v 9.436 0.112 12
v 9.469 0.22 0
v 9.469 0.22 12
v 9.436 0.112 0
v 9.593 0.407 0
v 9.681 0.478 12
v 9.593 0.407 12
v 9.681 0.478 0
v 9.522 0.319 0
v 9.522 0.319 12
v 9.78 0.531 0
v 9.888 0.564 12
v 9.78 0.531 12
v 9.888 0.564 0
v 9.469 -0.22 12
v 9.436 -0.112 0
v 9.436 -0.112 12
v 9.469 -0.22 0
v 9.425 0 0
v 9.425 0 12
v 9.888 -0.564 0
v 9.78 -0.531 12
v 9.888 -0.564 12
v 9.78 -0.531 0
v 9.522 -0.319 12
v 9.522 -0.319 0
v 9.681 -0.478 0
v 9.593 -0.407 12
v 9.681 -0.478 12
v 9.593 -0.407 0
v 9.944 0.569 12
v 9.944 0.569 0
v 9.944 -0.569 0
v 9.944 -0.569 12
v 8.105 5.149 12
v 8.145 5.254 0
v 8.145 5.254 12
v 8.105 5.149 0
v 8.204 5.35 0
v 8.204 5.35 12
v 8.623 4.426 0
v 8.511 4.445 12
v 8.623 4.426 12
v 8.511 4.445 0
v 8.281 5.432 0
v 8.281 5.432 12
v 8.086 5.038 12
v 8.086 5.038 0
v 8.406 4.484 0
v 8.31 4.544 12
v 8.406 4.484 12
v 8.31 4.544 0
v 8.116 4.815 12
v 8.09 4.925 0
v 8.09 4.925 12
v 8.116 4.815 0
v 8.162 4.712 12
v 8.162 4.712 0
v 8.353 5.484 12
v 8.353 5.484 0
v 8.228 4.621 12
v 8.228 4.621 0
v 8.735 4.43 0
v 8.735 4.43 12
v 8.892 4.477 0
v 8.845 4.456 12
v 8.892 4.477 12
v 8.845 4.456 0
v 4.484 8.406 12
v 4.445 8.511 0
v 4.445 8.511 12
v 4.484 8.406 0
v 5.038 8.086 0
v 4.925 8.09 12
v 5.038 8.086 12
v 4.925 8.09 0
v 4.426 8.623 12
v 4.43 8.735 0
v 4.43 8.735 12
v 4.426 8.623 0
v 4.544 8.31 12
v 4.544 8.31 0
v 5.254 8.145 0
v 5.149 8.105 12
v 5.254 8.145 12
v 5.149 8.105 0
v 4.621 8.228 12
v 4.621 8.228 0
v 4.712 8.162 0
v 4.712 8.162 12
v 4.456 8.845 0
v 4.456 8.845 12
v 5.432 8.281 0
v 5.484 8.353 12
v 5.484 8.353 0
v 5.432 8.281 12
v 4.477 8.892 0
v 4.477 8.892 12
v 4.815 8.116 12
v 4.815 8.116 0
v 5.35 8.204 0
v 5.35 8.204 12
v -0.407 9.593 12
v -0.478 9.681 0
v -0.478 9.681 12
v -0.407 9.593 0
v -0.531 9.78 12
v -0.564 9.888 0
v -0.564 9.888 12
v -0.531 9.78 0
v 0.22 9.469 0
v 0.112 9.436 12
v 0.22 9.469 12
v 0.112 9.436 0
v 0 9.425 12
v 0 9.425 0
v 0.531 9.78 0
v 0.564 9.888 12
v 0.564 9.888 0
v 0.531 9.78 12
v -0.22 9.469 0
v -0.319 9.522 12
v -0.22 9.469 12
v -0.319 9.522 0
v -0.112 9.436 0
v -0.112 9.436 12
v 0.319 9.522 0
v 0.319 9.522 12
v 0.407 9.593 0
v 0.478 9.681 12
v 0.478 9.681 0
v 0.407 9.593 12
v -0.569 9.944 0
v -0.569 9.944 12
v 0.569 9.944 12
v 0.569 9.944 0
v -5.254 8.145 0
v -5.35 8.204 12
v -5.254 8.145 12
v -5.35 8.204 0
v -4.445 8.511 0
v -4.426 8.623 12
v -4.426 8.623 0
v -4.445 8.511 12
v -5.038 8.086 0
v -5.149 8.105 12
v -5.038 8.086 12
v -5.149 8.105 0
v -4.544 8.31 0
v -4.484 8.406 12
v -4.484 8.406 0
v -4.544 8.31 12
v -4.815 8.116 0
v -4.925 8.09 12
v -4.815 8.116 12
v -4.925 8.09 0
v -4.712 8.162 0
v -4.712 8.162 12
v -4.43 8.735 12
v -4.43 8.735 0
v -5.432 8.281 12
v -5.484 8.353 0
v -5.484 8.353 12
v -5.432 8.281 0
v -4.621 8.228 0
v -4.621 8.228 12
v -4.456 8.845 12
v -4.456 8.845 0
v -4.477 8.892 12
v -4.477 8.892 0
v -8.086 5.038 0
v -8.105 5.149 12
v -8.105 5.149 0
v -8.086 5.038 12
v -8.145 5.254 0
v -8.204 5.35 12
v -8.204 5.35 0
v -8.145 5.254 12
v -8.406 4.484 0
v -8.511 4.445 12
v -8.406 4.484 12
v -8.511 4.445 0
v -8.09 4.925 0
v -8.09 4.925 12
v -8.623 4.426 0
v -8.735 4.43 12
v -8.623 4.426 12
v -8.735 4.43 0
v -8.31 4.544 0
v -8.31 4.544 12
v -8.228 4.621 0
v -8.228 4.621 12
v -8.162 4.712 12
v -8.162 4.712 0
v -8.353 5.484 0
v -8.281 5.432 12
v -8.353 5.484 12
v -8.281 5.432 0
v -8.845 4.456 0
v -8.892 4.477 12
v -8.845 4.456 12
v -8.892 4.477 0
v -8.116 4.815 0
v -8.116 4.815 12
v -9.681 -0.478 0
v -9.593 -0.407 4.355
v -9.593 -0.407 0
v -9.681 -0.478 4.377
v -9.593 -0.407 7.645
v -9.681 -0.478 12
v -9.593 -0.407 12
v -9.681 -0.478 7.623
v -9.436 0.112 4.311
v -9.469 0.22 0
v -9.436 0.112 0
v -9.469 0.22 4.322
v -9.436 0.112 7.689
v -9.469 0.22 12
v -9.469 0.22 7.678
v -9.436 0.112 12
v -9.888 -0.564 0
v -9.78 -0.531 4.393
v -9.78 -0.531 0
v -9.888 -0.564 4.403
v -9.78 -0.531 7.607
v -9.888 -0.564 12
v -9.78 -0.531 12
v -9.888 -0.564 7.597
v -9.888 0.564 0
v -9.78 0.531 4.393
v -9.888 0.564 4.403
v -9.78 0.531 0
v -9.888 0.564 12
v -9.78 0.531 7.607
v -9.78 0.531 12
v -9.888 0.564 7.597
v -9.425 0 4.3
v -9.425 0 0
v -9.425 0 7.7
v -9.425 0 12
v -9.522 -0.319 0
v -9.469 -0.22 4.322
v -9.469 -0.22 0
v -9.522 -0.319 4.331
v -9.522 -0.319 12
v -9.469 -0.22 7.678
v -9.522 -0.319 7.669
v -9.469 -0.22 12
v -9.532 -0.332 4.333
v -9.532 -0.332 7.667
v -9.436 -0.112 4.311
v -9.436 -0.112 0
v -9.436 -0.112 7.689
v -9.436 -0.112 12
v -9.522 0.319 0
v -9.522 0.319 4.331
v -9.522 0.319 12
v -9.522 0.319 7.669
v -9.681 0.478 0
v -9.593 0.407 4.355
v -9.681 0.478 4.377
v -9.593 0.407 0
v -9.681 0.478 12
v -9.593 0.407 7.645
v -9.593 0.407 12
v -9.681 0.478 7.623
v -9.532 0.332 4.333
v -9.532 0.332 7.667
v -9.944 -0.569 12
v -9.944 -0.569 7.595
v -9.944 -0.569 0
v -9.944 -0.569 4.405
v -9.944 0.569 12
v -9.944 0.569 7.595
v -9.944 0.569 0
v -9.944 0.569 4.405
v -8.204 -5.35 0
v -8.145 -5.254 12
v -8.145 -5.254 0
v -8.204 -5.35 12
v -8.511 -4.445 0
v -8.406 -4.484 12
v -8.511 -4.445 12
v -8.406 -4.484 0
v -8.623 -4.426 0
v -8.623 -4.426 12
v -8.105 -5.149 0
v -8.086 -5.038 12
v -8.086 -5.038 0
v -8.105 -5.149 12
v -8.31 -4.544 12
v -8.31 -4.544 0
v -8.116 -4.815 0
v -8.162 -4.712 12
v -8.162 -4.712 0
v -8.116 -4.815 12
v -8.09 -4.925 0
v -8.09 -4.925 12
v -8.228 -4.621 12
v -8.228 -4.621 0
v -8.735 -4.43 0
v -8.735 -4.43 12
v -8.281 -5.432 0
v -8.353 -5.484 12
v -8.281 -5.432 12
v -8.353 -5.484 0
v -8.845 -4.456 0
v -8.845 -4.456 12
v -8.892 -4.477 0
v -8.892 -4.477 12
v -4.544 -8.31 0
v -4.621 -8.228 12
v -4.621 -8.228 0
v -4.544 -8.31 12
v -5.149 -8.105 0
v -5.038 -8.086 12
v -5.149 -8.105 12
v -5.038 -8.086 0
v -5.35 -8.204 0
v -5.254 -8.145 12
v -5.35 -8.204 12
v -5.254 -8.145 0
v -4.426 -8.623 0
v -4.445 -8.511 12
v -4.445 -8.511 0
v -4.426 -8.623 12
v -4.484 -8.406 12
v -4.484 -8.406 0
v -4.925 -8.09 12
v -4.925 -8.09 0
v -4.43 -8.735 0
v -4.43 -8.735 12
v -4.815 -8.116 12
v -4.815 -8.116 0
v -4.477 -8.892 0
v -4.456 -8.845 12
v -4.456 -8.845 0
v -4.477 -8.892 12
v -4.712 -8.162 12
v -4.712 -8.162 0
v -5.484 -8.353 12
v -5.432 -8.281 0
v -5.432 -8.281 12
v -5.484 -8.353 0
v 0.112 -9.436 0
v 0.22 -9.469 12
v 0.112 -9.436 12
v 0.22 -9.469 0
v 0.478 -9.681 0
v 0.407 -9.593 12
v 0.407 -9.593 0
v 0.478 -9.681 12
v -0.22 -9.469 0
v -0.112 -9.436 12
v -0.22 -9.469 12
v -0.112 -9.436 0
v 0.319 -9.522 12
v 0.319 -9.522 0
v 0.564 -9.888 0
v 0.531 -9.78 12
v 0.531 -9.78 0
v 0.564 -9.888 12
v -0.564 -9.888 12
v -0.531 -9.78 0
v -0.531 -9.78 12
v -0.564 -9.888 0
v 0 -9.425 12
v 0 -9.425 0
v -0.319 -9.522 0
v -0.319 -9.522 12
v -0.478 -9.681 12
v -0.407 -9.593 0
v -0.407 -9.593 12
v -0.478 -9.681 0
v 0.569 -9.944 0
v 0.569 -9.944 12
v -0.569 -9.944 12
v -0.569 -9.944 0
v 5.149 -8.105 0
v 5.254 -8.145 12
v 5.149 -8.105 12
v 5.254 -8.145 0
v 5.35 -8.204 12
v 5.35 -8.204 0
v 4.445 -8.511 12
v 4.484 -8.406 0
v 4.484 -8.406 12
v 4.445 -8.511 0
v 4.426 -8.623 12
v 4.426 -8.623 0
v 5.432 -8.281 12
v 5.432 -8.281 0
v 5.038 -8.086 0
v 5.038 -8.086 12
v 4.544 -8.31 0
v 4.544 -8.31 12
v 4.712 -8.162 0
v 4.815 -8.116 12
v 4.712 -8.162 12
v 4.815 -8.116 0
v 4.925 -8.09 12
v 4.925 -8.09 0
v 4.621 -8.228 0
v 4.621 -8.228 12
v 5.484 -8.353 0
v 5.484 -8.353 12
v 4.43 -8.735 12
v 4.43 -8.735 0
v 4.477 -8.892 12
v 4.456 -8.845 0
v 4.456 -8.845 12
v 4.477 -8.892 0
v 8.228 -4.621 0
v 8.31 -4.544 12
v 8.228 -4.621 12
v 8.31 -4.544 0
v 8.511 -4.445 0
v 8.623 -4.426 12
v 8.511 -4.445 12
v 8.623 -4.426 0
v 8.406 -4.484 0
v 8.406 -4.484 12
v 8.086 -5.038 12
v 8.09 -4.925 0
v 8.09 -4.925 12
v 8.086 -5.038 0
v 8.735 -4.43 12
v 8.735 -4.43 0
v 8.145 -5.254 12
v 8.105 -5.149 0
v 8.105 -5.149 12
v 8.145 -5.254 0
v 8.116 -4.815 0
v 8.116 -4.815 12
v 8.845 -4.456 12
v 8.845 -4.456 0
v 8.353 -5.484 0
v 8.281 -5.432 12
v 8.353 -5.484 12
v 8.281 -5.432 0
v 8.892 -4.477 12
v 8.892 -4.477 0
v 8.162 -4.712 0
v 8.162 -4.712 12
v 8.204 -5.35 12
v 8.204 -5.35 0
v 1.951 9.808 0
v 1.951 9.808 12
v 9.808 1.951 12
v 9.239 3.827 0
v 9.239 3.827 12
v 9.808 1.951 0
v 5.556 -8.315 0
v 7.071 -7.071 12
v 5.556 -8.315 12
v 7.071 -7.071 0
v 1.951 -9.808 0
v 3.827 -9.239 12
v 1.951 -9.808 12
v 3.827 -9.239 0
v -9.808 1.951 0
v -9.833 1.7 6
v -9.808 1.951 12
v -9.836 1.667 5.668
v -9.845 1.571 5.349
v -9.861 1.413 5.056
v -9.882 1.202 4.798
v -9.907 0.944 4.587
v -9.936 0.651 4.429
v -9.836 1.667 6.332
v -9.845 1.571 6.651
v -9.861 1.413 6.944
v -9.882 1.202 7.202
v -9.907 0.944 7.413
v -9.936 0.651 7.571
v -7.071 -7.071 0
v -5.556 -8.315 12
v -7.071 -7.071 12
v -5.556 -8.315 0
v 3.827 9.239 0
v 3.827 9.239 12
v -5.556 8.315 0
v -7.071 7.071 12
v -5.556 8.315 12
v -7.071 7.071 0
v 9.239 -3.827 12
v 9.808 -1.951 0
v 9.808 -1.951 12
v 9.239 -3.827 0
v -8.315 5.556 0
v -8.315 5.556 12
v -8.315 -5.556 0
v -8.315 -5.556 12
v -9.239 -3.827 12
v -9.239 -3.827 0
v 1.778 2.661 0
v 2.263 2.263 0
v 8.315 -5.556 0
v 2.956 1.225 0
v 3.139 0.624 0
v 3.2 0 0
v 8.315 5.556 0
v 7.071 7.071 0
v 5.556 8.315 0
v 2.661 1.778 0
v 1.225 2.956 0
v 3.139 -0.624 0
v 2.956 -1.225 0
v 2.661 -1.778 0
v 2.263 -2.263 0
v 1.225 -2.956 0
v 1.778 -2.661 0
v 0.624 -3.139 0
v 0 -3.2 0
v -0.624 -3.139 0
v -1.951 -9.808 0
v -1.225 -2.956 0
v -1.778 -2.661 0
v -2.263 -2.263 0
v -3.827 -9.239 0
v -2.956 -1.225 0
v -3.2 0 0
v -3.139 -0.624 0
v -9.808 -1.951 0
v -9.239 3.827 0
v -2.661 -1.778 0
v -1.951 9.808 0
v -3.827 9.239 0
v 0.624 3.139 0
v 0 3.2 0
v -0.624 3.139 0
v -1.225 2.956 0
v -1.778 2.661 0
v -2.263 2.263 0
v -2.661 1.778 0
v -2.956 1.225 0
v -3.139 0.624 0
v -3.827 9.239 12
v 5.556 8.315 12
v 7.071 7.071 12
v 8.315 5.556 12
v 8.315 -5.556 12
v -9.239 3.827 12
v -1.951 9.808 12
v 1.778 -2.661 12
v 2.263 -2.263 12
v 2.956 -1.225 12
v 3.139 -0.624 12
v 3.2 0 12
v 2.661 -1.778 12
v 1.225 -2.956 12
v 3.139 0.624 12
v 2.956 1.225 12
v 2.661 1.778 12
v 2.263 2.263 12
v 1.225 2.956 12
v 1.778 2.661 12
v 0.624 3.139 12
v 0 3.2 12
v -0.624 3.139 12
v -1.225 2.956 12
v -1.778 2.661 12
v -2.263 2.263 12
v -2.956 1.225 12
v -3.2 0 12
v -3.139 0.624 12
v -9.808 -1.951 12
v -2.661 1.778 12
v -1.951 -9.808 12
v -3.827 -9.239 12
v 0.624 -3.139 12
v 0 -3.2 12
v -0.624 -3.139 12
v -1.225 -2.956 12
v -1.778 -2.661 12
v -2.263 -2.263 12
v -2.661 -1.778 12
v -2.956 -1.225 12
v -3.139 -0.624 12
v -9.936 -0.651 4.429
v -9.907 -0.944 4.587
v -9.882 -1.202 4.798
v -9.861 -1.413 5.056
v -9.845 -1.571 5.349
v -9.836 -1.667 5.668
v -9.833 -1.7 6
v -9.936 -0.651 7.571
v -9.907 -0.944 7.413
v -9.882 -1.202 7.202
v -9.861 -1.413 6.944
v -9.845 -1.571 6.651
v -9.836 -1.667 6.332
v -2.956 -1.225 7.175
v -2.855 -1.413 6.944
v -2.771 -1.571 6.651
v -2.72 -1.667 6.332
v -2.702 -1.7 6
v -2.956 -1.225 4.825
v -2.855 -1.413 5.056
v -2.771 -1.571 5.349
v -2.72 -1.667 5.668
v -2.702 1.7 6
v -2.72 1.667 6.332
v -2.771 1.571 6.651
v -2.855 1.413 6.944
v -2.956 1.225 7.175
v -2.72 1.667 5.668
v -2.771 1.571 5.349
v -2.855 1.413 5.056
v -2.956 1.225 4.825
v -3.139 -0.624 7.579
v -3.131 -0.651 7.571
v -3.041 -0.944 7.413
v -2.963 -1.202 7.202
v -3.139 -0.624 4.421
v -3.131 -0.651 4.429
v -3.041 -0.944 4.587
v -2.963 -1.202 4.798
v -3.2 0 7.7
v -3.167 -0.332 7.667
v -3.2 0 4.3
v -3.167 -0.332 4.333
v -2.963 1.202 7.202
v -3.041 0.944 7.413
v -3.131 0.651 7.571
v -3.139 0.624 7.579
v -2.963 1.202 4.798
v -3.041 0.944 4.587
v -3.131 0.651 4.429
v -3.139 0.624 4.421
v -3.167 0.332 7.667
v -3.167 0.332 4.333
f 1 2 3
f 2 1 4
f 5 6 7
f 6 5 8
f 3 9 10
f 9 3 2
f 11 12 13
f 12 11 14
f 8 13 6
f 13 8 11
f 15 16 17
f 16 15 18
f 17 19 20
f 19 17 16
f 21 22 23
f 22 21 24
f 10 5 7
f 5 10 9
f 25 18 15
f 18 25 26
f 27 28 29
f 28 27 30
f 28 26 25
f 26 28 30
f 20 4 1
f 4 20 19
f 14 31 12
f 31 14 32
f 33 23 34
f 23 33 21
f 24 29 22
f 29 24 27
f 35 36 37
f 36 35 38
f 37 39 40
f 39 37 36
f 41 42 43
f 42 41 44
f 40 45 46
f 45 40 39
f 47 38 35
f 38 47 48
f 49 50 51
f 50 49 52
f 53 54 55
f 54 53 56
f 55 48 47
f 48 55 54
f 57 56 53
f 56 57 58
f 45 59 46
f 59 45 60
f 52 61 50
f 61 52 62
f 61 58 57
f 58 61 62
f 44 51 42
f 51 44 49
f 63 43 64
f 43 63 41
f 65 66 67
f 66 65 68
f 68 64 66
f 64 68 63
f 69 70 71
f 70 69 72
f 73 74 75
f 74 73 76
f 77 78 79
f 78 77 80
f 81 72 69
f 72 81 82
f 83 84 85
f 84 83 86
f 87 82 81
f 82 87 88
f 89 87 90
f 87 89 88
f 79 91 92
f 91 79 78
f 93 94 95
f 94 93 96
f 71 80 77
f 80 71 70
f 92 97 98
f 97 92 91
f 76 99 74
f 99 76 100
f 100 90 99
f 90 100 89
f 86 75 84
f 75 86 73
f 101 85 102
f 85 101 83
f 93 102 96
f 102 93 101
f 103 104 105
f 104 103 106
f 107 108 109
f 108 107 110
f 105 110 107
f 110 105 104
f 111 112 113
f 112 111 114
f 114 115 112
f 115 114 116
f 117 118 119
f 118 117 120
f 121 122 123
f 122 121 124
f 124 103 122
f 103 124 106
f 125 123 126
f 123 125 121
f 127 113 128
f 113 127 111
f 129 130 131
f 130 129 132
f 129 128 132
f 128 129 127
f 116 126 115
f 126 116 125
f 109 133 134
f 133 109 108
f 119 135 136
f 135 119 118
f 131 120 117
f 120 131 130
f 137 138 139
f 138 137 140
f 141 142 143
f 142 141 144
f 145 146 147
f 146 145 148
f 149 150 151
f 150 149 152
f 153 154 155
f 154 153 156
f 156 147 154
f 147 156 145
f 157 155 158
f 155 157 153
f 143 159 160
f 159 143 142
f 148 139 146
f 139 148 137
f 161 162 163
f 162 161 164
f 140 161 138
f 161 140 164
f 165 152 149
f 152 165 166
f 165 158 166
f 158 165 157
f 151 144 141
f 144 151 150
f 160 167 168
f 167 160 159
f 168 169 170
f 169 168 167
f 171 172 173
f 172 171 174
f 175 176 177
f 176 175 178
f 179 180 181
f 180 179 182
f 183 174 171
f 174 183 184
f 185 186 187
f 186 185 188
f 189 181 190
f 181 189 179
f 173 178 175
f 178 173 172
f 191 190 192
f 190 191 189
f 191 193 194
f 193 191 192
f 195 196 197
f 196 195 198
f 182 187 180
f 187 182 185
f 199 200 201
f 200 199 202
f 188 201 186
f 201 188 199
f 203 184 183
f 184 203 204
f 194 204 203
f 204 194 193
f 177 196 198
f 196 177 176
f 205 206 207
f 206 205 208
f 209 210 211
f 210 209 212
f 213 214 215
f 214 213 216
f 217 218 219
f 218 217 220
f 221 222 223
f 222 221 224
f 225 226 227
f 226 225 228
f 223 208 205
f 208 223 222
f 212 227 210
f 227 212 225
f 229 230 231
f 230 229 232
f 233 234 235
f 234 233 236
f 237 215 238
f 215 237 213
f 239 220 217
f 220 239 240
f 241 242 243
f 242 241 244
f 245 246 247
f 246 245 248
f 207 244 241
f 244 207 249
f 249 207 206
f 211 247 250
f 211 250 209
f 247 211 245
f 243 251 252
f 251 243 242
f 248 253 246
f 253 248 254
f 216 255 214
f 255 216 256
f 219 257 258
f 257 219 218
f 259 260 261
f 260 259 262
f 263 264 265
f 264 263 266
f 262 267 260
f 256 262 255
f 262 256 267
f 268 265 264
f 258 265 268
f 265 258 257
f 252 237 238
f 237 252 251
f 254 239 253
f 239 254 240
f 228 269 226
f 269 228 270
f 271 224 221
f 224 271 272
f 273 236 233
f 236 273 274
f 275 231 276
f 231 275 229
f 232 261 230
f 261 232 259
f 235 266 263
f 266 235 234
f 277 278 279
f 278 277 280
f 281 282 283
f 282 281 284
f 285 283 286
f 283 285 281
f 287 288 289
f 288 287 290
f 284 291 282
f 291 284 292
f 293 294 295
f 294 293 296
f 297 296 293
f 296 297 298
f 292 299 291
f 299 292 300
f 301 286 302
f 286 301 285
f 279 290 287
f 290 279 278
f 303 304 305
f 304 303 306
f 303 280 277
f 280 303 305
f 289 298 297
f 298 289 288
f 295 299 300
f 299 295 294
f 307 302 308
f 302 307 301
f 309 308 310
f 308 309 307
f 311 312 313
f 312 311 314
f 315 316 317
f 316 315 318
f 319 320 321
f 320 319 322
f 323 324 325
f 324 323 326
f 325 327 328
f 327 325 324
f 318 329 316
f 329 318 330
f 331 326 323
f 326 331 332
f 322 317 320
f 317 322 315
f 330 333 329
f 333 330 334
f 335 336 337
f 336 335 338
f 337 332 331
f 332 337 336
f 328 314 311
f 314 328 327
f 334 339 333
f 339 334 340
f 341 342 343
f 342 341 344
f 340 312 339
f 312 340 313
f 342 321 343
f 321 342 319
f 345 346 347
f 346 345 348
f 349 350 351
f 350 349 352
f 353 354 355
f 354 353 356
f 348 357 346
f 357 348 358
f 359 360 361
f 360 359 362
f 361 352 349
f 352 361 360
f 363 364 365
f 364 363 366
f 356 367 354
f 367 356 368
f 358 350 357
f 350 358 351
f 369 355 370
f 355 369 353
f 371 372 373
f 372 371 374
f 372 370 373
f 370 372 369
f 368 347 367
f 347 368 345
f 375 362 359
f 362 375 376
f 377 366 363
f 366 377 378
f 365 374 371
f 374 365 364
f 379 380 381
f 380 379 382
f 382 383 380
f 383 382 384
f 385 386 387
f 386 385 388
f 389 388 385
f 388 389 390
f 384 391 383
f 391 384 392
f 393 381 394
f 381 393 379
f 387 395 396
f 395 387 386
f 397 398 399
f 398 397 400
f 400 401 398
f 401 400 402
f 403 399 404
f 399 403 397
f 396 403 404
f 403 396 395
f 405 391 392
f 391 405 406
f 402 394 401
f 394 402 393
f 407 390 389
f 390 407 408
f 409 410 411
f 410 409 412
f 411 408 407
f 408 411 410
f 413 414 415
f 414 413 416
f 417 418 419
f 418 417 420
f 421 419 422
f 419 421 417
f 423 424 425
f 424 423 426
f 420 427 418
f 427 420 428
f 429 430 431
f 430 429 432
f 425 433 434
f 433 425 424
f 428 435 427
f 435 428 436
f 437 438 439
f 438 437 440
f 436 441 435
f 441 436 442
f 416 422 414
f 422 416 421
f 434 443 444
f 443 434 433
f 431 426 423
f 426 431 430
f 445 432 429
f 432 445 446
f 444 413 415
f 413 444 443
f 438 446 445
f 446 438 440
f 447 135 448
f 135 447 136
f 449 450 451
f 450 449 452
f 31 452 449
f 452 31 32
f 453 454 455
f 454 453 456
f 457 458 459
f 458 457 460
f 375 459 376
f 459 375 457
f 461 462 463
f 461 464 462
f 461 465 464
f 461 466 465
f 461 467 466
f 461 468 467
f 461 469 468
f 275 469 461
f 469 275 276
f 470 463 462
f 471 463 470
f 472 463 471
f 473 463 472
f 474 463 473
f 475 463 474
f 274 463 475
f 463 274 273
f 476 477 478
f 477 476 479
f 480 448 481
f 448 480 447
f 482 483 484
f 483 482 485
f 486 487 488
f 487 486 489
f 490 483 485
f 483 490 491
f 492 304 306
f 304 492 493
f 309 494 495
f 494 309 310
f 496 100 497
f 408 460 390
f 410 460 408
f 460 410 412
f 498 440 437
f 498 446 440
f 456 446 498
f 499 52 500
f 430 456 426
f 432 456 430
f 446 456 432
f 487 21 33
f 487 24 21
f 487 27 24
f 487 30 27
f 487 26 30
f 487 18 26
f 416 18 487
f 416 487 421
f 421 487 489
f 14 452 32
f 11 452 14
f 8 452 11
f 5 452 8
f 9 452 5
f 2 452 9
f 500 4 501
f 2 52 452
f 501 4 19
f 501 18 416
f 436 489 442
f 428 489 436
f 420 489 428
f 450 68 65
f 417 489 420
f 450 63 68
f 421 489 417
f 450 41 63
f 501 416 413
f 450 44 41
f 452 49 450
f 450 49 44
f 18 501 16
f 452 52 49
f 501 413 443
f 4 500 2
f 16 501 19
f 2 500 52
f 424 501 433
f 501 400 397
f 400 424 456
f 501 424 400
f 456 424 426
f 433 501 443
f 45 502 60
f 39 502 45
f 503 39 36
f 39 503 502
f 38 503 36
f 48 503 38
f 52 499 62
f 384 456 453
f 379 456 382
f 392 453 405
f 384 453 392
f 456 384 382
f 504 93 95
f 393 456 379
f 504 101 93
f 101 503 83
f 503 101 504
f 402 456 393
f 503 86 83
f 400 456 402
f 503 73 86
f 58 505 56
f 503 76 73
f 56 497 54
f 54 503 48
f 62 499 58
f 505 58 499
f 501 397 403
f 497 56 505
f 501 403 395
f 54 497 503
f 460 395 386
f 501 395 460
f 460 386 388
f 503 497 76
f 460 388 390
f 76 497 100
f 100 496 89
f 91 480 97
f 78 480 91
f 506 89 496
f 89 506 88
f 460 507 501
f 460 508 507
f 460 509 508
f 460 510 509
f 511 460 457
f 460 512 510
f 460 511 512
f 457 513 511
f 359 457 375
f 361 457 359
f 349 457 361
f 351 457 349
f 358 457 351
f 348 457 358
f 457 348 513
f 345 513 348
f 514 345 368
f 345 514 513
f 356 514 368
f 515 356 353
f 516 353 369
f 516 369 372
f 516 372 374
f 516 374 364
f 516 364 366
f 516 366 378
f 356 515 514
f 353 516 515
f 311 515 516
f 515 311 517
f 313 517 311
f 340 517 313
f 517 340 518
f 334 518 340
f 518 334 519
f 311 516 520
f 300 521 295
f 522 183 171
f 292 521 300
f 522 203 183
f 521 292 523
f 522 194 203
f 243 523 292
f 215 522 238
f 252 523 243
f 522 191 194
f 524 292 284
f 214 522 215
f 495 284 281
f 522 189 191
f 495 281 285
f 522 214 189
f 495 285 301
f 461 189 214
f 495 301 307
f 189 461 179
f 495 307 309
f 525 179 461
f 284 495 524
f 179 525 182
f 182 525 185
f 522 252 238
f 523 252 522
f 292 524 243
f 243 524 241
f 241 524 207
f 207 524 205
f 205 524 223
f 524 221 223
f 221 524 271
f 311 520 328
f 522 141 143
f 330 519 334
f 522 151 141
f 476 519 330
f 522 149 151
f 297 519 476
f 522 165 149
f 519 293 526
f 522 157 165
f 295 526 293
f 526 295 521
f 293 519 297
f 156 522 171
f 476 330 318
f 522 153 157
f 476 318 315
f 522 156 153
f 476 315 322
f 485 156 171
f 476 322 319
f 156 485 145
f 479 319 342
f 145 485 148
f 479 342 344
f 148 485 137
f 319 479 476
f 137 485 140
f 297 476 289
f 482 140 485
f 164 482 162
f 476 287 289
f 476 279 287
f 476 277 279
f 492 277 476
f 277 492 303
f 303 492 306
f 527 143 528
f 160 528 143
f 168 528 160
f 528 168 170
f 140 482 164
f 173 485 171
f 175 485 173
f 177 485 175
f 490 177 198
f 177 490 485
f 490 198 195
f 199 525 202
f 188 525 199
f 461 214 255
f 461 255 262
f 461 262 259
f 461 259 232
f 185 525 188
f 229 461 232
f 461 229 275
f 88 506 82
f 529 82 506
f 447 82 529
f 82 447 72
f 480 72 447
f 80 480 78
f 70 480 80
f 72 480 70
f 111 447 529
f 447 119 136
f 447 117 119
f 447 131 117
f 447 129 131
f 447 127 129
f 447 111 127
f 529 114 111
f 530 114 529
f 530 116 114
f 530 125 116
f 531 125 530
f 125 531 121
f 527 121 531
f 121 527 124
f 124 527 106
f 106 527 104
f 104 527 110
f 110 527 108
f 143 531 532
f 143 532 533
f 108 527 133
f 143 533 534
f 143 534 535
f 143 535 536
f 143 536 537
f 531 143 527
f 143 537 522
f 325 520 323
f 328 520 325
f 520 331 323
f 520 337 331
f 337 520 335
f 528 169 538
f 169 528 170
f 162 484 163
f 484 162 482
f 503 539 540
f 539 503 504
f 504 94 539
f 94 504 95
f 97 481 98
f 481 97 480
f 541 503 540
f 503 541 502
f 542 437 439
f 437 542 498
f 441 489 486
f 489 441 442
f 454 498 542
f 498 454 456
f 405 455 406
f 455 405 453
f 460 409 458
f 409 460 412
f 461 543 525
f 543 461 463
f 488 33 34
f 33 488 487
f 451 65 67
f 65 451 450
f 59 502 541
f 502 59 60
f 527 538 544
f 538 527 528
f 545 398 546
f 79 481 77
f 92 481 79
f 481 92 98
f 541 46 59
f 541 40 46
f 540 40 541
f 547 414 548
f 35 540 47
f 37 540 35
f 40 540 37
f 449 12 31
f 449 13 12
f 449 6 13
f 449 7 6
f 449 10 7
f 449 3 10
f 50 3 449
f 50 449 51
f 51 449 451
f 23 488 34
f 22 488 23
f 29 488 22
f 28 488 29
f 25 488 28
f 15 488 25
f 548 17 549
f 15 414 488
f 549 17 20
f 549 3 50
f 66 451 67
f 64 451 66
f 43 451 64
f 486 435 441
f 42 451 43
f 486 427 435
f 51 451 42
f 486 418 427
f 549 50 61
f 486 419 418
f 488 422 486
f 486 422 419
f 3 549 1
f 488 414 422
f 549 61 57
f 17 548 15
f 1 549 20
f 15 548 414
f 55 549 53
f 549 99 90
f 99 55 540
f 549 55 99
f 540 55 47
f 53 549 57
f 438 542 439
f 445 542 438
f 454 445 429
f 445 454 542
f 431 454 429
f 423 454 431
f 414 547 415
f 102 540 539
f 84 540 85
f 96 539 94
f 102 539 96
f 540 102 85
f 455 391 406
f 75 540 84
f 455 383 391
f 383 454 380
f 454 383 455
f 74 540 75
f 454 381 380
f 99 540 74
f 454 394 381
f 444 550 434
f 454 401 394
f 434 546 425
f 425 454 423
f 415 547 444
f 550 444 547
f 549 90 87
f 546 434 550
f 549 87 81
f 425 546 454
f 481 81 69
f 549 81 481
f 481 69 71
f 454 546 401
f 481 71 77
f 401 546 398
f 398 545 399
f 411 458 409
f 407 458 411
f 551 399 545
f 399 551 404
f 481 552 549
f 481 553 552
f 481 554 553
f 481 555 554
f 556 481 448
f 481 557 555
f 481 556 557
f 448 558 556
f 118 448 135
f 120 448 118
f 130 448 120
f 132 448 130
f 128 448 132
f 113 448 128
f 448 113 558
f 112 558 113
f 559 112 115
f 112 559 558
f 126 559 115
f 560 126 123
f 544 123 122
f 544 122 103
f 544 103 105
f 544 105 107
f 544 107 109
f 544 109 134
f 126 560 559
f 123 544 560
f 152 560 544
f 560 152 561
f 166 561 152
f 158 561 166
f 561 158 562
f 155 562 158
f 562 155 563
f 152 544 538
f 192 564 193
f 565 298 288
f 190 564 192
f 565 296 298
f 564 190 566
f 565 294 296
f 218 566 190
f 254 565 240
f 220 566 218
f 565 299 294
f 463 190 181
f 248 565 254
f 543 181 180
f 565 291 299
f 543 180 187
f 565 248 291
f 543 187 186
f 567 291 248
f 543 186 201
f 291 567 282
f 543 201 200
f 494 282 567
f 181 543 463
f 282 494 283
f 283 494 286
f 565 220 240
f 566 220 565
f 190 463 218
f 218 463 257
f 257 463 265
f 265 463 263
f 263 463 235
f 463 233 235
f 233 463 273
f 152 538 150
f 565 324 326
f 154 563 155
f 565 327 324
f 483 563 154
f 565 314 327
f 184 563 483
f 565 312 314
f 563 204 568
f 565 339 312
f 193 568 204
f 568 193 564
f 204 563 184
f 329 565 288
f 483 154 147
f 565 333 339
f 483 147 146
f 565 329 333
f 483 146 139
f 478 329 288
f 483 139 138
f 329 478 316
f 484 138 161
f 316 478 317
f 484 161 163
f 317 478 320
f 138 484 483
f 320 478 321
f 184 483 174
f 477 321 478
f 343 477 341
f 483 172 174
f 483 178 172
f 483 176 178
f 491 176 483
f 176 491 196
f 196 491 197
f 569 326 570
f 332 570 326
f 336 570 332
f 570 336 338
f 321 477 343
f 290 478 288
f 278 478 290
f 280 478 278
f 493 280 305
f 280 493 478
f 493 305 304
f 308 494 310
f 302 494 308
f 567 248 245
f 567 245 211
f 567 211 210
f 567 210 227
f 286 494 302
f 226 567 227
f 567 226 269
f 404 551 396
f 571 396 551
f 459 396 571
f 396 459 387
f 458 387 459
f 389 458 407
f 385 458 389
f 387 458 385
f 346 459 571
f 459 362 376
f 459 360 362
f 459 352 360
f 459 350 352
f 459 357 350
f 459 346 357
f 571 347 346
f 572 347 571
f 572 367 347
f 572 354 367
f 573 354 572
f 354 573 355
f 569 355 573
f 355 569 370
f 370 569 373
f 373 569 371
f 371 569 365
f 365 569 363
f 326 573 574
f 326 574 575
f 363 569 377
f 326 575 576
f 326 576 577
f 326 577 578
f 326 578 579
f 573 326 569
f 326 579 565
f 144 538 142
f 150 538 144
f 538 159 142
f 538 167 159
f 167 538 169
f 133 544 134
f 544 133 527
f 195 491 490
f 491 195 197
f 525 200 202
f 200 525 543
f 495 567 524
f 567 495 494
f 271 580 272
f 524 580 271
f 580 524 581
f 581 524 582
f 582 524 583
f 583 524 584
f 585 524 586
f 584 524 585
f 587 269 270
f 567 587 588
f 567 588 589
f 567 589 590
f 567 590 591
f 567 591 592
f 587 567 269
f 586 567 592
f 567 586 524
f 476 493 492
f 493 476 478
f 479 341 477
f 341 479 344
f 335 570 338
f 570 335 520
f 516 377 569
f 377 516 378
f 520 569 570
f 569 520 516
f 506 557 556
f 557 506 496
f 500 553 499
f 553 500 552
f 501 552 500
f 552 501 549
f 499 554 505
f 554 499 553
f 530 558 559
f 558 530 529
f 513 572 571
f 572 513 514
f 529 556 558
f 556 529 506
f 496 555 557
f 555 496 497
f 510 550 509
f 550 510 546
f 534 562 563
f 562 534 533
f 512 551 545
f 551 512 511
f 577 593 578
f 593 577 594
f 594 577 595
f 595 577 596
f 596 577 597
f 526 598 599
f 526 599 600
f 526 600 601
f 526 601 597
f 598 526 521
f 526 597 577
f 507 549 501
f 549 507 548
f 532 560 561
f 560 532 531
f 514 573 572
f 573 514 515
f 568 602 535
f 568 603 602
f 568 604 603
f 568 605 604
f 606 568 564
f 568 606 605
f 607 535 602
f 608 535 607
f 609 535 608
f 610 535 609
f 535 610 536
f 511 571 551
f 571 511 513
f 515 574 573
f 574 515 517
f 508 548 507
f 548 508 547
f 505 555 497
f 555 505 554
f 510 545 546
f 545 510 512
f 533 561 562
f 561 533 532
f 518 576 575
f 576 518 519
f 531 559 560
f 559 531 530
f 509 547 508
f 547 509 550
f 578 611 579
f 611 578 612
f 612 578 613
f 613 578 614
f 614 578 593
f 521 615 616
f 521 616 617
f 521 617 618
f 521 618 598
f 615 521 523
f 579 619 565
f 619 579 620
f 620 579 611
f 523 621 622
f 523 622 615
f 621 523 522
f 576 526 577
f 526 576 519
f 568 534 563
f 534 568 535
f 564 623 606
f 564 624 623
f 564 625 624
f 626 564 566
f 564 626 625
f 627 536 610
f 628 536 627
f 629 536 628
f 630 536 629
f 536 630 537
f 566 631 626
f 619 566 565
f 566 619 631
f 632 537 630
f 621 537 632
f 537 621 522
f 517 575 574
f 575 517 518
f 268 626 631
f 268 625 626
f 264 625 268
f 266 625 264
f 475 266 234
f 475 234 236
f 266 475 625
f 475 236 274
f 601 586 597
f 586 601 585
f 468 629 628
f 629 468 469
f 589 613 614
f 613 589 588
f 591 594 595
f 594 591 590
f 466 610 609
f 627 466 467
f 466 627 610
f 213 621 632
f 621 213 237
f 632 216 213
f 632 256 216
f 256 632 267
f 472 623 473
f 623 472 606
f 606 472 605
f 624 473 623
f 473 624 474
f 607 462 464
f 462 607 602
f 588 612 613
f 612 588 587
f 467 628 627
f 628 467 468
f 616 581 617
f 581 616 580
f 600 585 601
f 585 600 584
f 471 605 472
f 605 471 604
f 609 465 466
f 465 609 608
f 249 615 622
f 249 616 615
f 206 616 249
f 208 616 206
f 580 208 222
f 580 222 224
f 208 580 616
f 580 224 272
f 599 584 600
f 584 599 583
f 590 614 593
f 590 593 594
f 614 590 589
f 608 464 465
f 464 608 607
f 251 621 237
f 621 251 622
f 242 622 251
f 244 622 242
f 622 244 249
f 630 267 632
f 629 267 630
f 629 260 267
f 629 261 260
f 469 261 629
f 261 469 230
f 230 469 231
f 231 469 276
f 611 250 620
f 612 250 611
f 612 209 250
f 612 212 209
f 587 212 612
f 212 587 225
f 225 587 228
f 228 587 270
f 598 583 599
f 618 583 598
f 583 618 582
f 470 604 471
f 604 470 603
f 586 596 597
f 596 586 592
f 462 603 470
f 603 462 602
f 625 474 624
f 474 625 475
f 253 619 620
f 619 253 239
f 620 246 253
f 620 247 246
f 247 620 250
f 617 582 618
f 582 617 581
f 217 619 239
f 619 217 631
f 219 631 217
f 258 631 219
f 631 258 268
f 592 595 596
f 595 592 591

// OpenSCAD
$fn = 32;

// ----------------------------------------------------------------------
// Hand knob: 20 x 20 x 12 mm
// ----------------------------------------------------------------------

// --- parameters (mm) ---
grip_d = 20;              // knob diameter
grip_h = 12;              // knob height
shaft_d = 6.4;            // shaft bore
set_d = 3.4;              // set screw tap hole
knurl_dia = 1.15;         // knurl groove diameter
knurl_n = 12;             // number of knurl grooves

module body() {
  cylinder(h = grip_h, d = grip_d);
}

difference() {
  union() {
    body();
  }
  translate([0, 0, -1]) cylinder(h = grip_h + 0 + 2, d = shaft_d);
  /* knurl grooves */
  for (i = [0 : knurl_n - 1])
    rotate([0, 0, i * 360 / knurl_n])
      translate([grip_d / 2, 0, -0.5])
        cylinder(h = grip_h + 1, d = knurl_dia);
  translate([-grip_d / 2 - 1, 0, grip_h * 0.5]) rotate([0, 90, 0]) cylinder(h = grip_d / 2 + 2, d = set_d);
}
